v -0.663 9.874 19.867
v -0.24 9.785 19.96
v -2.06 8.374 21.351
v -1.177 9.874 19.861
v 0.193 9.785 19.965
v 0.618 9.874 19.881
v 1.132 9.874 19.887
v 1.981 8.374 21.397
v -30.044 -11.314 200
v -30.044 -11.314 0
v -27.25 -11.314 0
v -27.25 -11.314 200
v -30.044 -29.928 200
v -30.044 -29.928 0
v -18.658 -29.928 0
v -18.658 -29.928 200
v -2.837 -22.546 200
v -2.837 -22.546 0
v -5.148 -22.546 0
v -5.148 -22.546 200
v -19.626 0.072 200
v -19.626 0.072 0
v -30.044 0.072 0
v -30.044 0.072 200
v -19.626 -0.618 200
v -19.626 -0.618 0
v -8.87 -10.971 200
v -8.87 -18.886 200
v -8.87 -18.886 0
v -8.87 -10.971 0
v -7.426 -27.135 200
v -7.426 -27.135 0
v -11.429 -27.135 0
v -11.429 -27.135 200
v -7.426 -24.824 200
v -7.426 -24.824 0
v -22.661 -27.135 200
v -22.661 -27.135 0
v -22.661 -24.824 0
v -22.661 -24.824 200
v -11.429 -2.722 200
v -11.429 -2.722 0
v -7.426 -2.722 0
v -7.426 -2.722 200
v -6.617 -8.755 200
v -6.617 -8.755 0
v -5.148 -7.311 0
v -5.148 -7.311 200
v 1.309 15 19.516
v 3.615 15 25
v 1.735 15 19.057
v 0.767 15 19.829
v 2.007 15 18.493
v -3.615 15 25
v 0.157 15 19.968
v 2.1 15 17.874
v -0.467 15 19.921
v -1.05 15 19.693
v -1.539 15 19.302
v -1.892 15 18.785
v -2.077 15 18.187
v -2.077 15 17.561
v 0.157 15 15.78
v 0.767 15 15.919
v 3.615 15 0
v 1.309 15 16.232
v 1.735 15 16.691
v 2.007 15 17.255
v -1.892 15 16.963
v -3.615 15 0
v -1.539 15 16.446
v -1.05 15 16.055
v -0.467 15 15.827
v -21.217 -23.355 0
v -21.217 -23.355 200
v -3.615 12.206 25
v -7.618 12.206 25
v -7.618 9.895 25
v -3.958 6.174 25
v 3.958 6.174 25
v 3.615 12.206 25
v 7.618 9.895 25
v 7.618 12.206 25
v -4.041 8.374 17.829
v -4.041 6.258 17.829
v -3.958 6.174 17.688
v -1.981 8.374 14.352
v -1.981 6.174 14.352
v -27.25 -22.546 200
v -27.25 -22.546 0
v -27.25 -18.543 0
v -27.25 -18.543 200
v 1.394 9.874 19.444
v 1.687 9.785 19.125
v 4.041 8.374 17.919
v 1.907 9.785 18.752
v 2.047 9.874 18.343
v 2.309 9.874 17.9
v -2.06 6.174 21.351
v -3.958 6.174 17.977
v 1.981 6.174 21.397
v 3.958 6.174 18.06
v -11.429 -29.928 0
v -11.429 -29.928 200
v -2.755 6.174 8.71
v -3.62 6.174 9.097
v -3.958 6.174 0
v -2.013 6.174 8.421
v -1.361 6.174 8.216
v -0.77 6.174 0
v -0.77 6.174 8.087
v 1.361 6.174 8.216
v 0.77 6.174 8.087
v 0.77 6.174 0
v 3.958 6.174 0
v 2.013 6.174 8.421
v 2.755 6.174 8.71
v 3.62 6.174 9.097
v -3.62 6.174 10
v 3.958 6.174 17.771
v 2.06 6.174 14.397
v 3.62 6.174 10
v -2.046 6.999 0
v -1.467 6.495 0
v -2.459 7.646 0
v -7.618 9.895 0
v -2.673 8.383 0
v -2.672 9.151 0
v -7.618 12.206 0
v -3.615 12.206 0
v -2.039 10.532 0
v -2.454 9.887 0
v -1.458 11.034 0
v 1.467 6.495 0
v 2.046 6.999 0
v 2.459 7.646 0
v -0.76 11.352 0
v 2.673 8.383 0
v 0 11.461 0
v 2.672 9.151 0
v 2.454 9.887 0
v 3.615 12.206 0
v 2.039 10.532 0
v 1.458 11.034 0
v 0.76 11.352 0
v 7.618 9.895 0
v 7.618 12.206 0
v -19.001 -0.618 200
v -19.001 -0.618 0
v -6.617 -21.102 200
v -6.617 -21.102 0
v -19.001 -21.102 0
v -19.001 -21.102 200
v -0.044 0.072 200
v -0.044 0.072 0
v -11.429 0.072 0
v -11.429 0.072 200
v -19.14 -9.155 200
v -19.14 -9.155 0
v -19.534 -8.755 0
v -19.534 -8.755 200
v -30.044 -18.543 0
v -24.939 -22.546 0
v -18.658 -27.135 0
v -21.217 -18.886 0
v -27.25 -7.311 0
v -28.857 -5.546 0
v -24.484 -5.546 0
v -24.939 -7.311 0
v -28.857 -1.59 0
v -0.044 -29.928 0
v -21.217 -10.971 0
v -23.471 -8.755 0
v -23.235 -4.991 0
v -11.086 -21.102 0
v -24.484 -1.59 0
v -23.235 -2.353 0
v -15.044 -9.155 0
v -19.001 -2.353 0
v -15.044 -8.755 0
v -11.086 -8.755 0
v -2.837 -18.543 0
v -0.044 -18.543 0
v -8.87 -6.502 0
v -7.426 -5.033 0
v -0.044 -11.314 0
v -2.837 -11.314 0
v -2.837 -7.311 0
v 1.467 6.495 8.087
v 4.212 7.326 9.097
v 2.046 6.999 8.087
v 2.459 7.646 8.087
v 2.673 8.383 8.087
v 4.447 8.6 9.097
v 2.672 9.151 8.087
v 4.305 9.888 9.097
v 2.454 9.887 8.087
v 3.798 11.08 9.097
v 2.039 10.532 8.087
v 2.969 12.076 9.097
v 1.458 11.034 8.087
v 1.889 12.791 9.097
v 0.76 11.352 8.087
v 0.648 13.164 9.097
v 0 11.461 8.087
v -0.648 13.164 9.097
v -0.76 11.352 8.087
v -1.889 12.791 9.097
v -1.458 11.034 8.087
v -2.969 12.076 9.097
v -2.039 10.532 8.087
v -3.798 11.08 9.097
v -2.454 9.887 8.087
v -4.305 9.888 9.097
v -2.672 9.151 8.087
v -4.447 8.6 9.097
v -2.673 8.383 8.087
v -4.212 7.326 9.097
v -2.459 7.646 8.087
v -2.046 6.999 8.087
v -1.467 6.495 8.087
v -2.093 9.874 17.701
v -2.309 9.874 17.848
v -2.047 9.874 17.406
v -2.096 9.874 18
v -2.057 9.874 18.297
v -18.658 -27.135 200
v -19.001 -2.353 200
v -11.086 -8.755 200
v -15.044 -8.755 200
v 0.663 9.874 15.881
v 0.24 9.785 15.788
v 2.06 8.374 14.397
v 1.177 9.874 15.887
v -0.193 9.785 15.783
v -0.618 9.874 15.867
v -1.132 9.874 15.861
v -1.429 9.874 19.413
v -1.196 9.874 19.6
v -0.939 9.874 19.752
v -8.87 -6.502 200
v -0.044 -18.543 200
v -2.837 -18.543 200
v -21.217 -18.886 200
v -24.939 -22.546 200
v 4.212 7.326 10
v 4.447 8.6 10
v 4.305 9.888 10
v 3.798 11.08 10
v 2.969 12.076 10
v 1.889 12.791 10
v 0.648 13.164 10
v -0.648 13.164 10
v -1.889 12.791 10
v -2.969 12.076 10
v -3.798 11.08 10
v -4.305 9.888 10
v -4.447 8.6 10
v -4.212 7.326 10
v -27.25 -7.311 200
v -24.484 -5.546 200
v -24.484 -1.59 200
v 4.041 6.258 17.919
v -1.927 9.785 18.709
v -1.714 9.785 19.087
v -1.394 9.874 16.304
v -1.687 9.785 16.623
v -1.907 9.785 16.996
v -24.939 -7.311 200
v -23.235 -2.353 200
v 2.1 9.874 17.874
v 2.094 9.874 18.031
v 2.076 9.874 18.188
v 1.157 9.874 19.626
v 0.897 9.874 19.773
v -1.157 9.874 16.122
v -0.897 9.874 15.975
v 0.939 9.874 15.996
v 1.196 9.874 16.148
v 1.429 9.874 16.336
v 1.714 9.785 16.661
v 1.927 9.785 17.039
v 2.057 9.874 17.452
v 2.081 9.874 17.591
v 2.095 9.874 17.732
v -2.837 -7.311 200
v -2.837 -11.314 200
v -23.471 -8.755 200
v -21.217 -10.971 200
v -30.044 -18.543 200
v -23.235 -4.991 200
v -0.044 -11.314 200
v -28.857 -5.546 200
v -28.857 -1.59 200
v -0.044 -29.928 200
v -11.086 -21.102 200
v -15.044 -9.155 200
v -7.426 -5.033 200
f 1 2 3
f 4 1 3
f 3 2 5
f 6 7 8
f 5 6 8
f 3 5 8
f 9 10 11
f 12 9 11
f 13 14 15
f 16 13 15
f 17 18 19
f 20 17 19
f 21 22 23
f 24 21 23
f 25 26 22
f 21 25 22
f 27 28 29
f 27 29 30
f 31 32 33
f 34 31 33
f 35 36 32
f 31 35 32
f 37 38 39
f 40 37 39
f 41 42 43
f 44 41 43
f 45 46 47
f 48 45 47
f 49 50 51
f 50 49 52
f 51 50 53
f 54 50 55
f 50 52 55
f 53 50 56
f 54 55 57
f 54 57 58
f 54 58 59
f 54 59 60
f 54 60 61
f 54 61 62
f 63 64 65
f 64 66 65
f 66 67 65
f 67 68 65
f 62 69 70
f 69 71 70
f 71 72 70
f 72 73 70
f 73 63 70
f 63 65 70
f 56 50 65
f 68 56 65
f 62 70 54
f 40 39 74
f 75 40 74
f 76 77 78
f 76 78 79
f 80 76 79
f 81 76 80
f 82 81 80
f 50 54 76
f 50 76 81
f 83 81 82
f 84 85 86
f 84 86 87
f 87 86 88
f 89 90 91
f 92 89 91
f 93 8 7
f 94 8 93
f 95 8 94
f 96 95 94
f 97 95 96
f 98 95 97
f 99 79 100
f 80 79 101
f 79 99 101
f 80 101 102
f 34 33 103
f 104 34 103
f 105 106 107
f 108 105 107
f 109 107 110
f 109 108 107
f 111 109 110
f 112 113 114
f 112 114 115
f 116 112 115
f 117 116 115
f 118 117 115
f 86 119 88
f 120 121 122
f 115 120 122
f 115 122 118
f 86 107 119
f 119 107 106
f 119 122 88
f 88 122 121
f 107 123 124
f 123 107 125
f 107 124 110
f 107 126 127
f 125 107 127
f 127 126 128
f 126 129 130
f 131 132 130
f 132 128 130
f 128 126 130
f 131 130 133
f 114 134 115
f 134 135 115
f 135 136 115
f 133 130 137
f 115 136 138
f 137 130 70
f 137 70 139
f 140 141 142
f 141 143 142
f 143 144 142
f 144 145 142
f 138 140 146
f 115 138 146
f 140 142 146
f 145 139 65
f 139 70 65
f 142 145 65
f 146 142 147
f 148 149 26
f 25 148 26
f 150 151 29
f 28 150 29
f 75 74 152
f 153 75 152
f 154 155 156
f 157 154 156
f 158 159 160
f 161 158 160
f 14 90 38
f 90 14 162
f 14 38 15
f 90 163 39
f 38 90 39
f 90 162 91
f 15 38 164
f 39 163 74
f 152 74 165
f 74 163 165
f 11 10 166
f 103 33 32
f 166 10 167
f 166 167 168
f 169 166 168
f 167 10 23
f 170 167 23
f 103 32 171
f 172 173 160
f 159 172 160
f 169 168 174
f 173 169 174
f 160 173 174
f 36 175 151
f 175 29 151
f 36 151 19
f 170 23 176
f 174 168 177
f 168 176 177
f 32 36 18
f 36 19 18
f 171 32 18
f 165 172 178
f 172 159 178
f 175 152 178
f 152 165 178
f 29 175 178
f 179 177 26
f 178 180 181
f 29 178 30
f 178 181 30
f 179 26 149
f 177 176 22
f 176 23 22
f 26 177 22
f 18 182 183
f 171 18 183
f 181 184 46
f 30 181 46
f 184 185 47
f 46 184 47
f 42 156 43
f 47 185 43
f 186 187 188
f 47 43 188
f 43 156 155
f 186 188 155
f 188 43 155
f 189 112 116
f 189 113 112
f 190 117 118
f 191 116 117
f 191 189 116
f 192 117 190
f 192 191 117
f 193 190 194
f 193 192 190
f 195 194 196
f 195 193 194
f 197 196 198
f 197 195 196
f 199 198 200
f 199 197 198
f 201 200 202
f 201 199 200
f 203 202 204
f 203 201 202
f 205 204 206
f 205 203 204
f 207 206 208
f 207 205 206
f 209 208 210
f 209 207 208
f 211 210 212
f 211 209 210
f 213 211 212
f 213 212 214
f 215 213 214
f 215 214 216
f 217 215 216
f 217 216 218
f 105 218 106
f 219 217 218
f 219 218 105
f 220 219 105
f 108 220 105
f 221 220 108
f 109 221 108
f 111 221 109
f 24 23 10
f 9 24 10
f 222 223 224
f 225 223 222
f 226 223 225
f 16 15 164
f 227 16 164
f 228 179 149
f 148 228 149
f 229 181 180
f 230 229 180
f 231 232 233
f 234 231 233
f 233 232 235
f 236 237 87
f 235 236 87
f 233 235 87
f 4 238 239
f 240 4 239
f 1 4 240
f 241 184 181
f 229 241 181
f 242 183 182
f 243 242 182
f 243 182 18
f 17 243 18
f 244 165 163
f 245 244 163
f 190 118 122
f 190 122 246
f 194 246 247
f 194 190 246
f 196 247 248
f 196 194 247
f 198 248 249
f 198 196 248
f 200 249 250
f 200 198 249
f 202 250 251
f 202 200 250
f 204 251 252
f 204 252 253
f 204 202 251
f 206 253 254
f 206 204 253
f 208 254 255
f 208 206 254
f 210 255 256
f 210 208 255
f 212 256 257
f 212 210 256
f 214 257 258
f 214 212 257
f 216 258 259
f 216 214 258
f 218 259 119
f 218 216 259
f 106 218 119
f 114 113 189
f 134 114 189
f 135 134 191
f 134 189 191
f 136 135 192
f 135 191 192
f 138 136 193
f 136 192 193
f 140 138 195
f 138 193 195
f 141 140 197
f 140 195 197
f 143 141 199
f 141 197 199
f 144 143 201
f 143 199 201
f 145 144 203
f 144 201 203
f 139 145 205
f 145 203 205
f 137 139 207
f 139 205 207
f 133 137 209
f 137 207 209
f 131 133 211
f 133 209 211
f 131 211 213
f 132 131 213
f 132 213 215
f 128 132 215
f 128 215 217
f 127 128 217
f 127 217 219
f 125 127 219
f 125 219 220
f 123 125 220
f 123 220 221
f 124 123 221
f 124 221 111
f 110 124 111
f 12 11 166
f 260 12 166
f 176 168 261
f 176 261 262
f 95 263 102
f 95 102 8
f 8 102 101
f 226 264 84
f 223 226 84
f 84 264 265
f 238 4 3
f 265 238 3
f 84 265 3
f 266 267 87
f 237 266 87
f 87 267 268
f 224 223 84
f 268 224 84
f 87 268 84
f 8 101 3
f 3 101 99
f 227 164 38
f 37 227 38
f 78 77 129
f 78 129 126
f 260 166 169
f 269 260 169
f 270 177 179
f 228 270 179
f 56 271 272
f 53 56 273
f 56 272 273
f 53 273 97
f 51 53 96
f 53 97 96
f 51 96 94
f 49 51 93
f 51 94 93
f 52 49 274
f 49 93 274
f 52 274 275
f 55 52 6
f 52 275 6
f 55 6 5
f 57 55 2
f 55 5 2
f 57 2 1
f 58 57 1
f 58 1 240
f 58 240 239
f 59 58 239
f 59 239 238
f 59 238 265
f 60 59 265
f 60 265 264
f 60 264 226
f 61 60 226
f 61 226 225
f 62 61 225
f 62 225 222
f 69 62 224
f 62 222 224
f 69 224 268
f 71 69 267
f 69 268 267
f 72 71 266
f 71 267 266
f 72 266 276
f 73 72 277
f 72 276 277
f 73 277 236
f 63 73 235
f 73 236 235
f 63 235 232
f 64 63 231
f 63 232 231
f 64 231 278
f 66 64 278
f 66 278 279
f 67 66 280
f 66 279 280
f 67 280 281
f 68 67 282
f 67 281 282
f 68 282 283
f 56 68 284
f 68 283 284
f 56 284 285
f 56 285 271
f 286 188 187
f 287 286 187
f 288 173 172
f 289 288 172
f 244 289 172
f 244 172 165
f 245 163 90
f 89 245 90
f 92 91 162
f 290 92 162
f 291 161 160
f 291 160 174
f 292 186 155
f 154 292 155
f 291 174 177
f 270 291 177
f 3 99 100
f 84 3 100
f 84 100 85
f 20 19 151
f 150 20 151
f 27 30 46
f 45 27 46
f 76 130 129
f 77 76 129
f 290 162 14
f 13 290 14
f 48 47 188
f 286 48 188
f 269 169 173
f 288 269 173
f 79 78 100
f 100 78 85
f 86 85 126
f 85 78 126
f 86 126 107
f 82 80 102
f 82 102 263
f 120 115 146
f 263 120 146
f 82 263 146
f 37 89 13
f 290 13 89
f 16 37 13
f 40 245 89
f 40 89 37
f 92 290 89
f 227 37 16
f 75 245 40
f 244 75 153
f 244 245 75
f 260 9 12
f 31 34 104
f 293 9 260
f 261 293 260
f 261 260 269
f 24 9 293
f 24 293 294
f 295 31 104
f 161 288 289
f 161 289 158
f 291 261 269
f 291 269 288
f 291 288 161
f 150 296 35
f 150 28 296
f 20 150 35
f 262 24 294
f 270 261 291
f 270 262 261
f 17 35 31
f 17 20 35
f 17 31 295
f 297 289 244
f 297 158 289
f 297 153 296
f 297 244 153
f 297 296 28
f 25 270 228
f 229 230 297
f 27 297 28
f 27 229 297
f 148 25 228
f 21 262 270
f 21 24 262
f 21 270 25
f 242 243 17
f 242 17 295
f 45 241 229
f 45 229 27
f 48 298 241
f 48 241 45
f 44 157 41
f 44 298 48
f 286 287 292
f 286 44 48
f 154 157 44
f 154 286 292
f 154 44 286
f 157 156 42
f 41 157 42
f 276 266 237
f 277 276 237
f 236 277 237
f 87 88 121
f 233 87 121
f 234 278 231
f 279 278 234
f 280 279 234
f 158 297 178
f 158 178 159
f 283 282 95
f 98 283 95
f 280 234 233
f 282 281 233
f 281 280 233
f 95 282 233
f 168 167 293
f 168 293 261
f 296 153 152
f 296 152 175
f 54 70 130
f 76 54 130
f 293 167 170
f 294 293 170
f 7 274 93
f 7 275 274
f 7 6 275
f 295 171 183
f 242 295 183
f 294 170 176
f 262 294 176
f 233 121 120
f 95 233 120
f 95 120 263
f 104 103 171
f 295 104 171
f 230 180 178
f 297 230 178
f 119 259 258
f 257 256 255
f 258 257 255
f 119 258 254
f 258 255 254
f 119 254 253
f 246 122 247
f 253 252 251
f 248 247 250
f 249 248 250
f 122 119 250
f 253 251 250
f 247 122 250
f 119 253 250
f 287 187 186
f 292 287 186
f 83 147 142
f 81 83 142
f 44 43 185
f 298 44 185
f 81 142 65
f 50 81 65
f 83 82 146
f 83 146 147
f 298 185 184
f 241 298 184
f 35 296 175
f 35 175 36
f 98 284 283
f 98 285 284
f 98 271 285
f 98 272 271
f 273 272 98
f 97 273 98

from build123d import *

# Parameters (mm, degrees)
F1_DEPTH     = 25
F2_R         = 2.7
F3_DEPTH     = 10
F4_R         = 2.1
F5_DEPTH     = 3.7
F6_DEPTH     = 25
F7_START     = 8
F2_R_2       = 4.45
F7_DEPTH     = 2
F8_T4_ANGLE  = 359.64
F8_S6_R      = 2.7
F8_T7_DEPTH  = 8
F9_T4_DEPTH  = 11.7565008482
F9_S5_R      = 2.1
F9_T6_DEPTH  = 8
F9_T10_DEPTH = 11.7565008482
F9_S11_R     = 2.1
F9_T12_DEPTH = 8
F9_T16_DEPTH = 11.7565008482
F9_S17_R     = 2.1
F9_T18_DEPTH = 7
F9_T22_DEPTH = 11.7565008482
F9_S23_R     = 2.1
F9_T24_DEPTH = 8
F9_T28_DEPTH = 11.7565008482
F9_S29_R     = 2.1
F9_T30_DEPTH = 7
F9_T34_DEPTH = 11.7565008482
F9_S35_R     = 2.1
F9_T36_DEPTH = 8
F10_W        = 4.3724142015
F10_H        = 3.9559938014
F11_DEPTH    = 200


# Not quite as in the source:
# - a fillet or chamfer that OpenCascade refuses, or shapes differently, is made with other operations: its cross-section is extruded or revolved along the edge and cut away or added


with BuildPart() as f1:
    # F0 (on Top) → F1 (new body)
    with BuildSketch(Plane.XY):
        Polygon((0, 15), (-3.6146675702, 15), (-3.6146675702, 12.2064198286), (-7.6176160946, 12.2064198286), (-7.6176160946, 9.8954397172), (-3.9578238502, 6.1736169547), (0, 6.1736169547), align=None)
        Polygon((3.6146675702, 12.2064198286), (3.6146675702, 15), (0, 15), (0, 6.1736169547), (3.9578238502, 6.1736169547), (7.6176160946, 9.8954397172), (7.6176160946, 12.2064198286), align=None)
    extrude(amount=F1_DEPTH)

    # F2 (on Top) → F3 (cut)
    with BuildSketch(Plane.XY):
        with Locations((0, 8.76147)):
            Circle(F2_R)
    extrude(amount=F3_DEPTH, mode=Mode.SUBTRACT)

    # F4 (on face) → F5 (cut)
    with BuildSketch(Plane.XZ.offset(-6.1736169547)):
        Polygon((2.059832568, 14.396983778), (4.0411979619, 17.9194153968), (1.9813653939, 21.3965439715), (-2.059832568, 21.3512409274), (-4.0411979619, 17.8288093087), (-1.9813653939, 14.3516807339), align=None)
        with Locations((0, 17.8741123527)):
            Circle(F4_R, mode=Mode.SUBTRACT)
    extrude(amount=-F5_DEPTH, mode=Mode.SUBTRACT)

    # F4 (on face) → F6 (cut)
    with BuildSketch(Plane.XZ.offset(-6.1736169547)):
        with Locations((0, 17.8741123527)):
            Circle(F4_R)
    extrude(amount=-F6_DEPTH, mode=Mode.SUBTRACT)

    # F2 (on Top) → F7 (cut)
    with BuildSketch(Plane.XY.offset(F7_START)):
        with Locations((0, 8.76147)):
            Circle(F2_R_2)
        with Locations((0, 8.76147)):
            Circle(F2_R, mode=Mode.SUBTRACT)
        with Locations((0, 8.76147)):
            Circle(F2_R)
    extrude(amount=F7_DEPTH, mode=Mode.SUBTRACT)

    # F8: chamfer of 1.9 x 1.0969655115 on 1 edges, made by hand


with BuildPart() as f8_tool2:
    # F8_s3 → F8_t4 (revolve)
    with BuildSketch(Plane(origin=(0.0275247887, 8.6472e-05, 0), x_dir=(0, 0, 1), z_dir=(-0.9999950652, -0.0031415875, 0))):
        Polygon((9.0969655115, 4.3114267639), (8, 6.2114267639), (8, 4.3114267639), align=None)
    revolve(axis=Axis((0, 8.76147, 8), (0, 0, 1)), revolution_arc=F8_T4_ANGLE)

    split(bisect_by=Plane.XZ.offset(-6.1736169547), keep=Keep.BOTTOM)

    # F8_s6 → F8_t7 (cut, symmetric)
    with BuildSketch(Plane.XY.offset(8.5)):
        with Locations((0, 8.76147)):
            Circle(F8_S6_R)
    extrude(amount=F8_T7_DEPTH, both=True, mode=Mode.SUBTRACT)


with BuildPart() as f1_1:
    add(f1.part)

    # F8_t1: union F8_tool2
    add(f8_tool2.part)

    # F9: chamfer of 1.5 on 6 edges, made by hand


with BuildPart() as f9_tool2:
    # F9_s3 → F9_t4 (new body)
    with BuildSketch(Plane(origin=(-4.8419417128, 0, 8.173506016), x_dir=(0, 1, 0), z_dir=(-0.5096763804, 0, 0.8603661937))):
        Polygon((8.3736169547, -12.610012887), (9.8736169547, -11.110012887), (9.8736169547, -12.610012887), align=None)
    extrude(amount=F9_T4_DEPTH)

    # F9_s5 → F9_t6 (cut, symmetric)
    with BuildSketch(Plane.XZ.offset(-9.1)):
        with Locations((0, 17.8741123527)):
            Circle(F9_S5_R)
    extrude(amount=F9_T6_DEPTH, both=True, mode=Mode.SUBTRACT)


with BuildPart() as f1_2:
    add(f1_1.part)

    # F9_t1: union F9_tool2
    add(f9_tool2.part)


with BuildPart() as f9_tool8:
    # F9_s9 → F9_t10 (new body)
    with BuildSketch(Plane(origin=(4.7557224198, 0, 8.4546278405), x_dir=(0, 1, 0), z_dir=(0.4902607901, 0, 0.87157579))):
        Polygon((9.8736169547, 6.7629764442), (8.3736169547, 5.2629764442), (9.8736169547, 5.2629764442), align=None)
    extrude(amount=F9_T10_DEPTH)

    # F9_s11 → F9_t12 (cut, symmetric)
    with BuildSketch(Plane.XZ.offset(-9.1)):
        with Locations((0, 17.8741123527)):
            Circle(F9_S11_R)
    extrude(amount=F9_T12_DEPTH, both=True, mode=Mode.SUBTRACT)


with BuildPart() as f1_3:
    add(f1_2.part)

    # F9_t7: union F9_tool8
    add(f9_tool8.part)


with BuildPart() as f9_tool14:
    # F9_s15 → F9_t16 (new body)
    with BuildSketch(Plane(origin=(-5.6775321016, 0, -0.0636468417), x_dir=(0, 1, 0), z_dir=(0.9999371705, 0, 0.0112095963))):
        Polygon((9.8736169547, 15.8729893312), (8.3736169547, 14.3729893312), (9.8736169547, 14.3729893312), align=None)
    extrude(amount=F9_T16_DEPTH)

    # F9_s17 → F9_t18 (cut, symmetric)
    with BuildSketch(Plane.XZ.offset(-9.1)):
        with Locations((0, 17.8741123527)):
            Circle(F9_S17_R)
    extrude(amount=F9_T18_DEPTH, both=True, mode=Mode.SUBTRACT)


with BuildPart() as f1_4:
    add(f1_3.part)

    # F9_t13: union F9_tool14
    add(f9_tool14.part)


with BuildPart() as f9_tool20:
    # F9_s21 → F9_t22 (new body)
    with BuildSketch(Plane(origin=(-10.8339525114, 0, 18.288401902), x_dir=(0, 1, 0), z_dir=(0.5096763804, 0, -0.8603661937))):
        Polygon((9.8736169547, 7.110012887), (8.3736169547, 5.610012887), (9.8736169547, 5.610012887), align=None)
    extrude(amount=F9_T22_DEPTH)

    # F9_s23 → F9_t24 (cut, symmetric)
    with BuildSketch(Plane.XZ.offset(-9.1)):
        with Locations((0, 17.8741123527)):
            Circle(F9_S23_R)
    extrude(amount=F9_T24_DEPTH, both=True, mode=Mode.SUBTRACT)


with BuildPart() as f1_5:
    add(f1_4.part)

    # F9_t19: union F9_tool20
    add(f9_tool20.part)


with BuildPart() as f9_tool26:
    # F9_s27 → F9_t28 (new body)
    with BuildSketch(Plane(origin=(6.0782300916, 0, 0.0681387867), x_dir=(0, 1, 0), z_dir=(-0.9999371705, 0, -0.0112095963))):
        Polygon((9.8736169547, -19.8729893312), (8.3736169547, -21.3729893312), (9.8736169547, -21.3729893312), align=None)
    extrude(amount=F9_T28_DEPTH)

    # F9_s29 → F9_t30 (cut, symmetric)
    with BuildSketch(Plane.XZ.offset(-9.1)):
        with Locations((0, 17.8741123527)):
            Circle(F9_S29_R)
    extrude(amount=F9_T30_DEPTH, both=True, mode=Mode.SUBTRACT)


with BuildPart() as f1_6:
    add(f1_5.part)

    # F9_t25: union F9_tool26
    add(f9_tool26.part)


with BuildPart() as f9_tool32:
    # F9_s33 → F9_t34 (new body)
    with BuildSketch(Plane(origin=(10.5194738143, 0, 18.7013093548), x_dir=(0, 1, 0), z_dir=(-0.4902607901, 0, -0.87157579))):
        Polygon((9.8736169547, -10.7629764442), (8.3736169547, -12.2629764442), (9.8736169547, -12.2629764442), align=None)
    extrude(amount=F9_T34_DEPTH)

    # F9_s35 → F9_t36 (cut, symmetric)
    with BuildSketch(Plane.XZ.offset(-9.1)):
        with Locations((0, 17.8741123527)):
            Circle(F9_S35_R)
    extrude(amount=F9_T36_DEPTH, both=True, mode=Mode.SUBTRACT)


with BuildPart() as f1_7:
    add(f1_6.part)

    # F9_t31: union F9_tool32
    add(f9_tool32.part)


with BuildPart() as f11:
    # F10 (on Top) → F11 (new body)
    with BuildSketch(Plane.XY):
        Polygon((-24.939087107, -7.310864791), (-23.4706133497, -8.754863931), (-19.5336121346, -8.754863931), (-23.2350792623, -4.9906599296), (-23.2350792623, -2.3533313495), (-19.00147124, -2.3533313495), (-19.00147124, -0.6182457281), (-19.6261023059, -0.6182457281), (-19.6261023059, 0.0715191143), (-30.0436473898, 0.0715191143), (-30.0436473898, -8.754863931), (-27.2500672184, -8.754863931), (-27.2500672184, -7.310864791), align=None)
        with Locations((-26.6705475635, -3.5678905395)):
            Rectangle(F10_W, F10_H, mode=Mode.SUBTRACT)
        Polygon((-11.0858235396, -21.1020978404), (-6.6166814299, -21.1020978404), (-8.8700304351, -18.8863047359), (-8.8700304351, -10.9706570355), (-8.8700304351, -8.754863931), (-11.0858235396, -8.754863931), (-15.0436473898, -8.754863931), (-15.0436473898, -9.154863931), (-19.1402788162, -9.154863931), (-19.5336121346, -8.754863931), (-23.4706133497, -8.754863931), (-21.2172643445, -10.9706570355), (-21.2172643445, -18.8863047359), (-21.2172643445, -23.3554468456), (-19.00147124, -21.1020978404), align=None)
        Polygon((-27.2500672184, -11.3138133155), (-27.2500672184, -8.754863931), (-30.0436473898, -8.754863931), (-30.0436473898, -10.3460259696), (-30.0436473898, -11.3138133155), align=None)
        Polygon((-8.8700304351, -8.754863931), (-6.6166814299, -8.754863931), (-5.1482076726, -7.310864791), (-2.8372275612, -7.310864791), (-2.8372275612, -8.754863931), (-0.0436473898, -8.754863931), (-0.0436473898, 0.0715191143), (-8.8700304351, 0.0715191143), (-8.8700304351, -2.7220610571), (-7.4260312951, -2.7220610571), (-7.4260312951, -5.0330411685), (-8.8700304351, -6.5015149258), align=None)
        Polygon((-2.8372275612, -11.3138133155), (-0.0436473898, -11.3138133155), (-0.0436473898, -10.3460259696), (-0.0436473898, -8.754863931), (-2.8372275612, -8.754863931), align=None)
        Polygon((-2.8372275612, -21.1020978404), (-0.0436473898, -21.1020978404), (-0.0436473898, -19.5109358018), (-0.0436473898, -18.5431484559), (-2.8372275612, -18.5431484559), align=None)
        Polygon((-10.4611924737, -29.9284808857), (-0.0436473898, -29.9284808857), (-0.0436473898, -21.1020978404), (-2.8372275612, -21.1020978404), (-2.8372275612, -22.5460969803), (-5.1482076726, -22.5460969803), (-6.6166814299, -21.1020978404), (-11.0858235396, -21.1020978404), (-7.4260312951, -24.8239206029), (-7.4260312951, -27.1349007143), (-11.4289798196, -27.1349007143), (-11.4289798196, -29.9284808857), align=None)
        Polygon((-30.0436473898, -29.9284808857), (-21.2172643445, -29.9284808857), (-21.2172643445, -27.1349007143), (-22.6612634844, -27.1349007143), (-22.6612634844, -24.8239206029), (-21.2172643445, -23.3554468456), (-21.2172643445, -18.8863047359), (-24.939087107, -22.5460969803), (-27.2500672184, -22.5460969803), (-27.2500672184, -18.5431484559), (-30.0436473898, -18.5431484559), (-30.0436473898, -19.5109358018), align=None)
        Polygon((-19.6261023059, -29.9284808857), (-18.65831496, -29.9284808857), (-18.65831496, -27.1349007143), (-21.2172643445, -27.1349007143), (-21.2172643445, -29.9284808857), align=None)
        Polygon((-11.4289798196, -2.7220610571), (-8.8700304351, -2.7220610571), (-8.8700304351, 0.0715191143), (-10.4611924737, 0.0715191143), (-11.4289798196, 0.0715191143), align=None)
        Polygon((-11.0858235396, -8.754863931), (-8.8700304351, -8.754863931), (-8.8700304351, -6.5015149258), align=None)
        Polygon((-8.8700304351, -8.754863931), (-8.8700304351, -10.9706570355), (-6.6166814299, -8.754863931), align=None)
    extrude(amount=F11_DEPTH)


solid = Compound([f1_7.part, f11.part])
